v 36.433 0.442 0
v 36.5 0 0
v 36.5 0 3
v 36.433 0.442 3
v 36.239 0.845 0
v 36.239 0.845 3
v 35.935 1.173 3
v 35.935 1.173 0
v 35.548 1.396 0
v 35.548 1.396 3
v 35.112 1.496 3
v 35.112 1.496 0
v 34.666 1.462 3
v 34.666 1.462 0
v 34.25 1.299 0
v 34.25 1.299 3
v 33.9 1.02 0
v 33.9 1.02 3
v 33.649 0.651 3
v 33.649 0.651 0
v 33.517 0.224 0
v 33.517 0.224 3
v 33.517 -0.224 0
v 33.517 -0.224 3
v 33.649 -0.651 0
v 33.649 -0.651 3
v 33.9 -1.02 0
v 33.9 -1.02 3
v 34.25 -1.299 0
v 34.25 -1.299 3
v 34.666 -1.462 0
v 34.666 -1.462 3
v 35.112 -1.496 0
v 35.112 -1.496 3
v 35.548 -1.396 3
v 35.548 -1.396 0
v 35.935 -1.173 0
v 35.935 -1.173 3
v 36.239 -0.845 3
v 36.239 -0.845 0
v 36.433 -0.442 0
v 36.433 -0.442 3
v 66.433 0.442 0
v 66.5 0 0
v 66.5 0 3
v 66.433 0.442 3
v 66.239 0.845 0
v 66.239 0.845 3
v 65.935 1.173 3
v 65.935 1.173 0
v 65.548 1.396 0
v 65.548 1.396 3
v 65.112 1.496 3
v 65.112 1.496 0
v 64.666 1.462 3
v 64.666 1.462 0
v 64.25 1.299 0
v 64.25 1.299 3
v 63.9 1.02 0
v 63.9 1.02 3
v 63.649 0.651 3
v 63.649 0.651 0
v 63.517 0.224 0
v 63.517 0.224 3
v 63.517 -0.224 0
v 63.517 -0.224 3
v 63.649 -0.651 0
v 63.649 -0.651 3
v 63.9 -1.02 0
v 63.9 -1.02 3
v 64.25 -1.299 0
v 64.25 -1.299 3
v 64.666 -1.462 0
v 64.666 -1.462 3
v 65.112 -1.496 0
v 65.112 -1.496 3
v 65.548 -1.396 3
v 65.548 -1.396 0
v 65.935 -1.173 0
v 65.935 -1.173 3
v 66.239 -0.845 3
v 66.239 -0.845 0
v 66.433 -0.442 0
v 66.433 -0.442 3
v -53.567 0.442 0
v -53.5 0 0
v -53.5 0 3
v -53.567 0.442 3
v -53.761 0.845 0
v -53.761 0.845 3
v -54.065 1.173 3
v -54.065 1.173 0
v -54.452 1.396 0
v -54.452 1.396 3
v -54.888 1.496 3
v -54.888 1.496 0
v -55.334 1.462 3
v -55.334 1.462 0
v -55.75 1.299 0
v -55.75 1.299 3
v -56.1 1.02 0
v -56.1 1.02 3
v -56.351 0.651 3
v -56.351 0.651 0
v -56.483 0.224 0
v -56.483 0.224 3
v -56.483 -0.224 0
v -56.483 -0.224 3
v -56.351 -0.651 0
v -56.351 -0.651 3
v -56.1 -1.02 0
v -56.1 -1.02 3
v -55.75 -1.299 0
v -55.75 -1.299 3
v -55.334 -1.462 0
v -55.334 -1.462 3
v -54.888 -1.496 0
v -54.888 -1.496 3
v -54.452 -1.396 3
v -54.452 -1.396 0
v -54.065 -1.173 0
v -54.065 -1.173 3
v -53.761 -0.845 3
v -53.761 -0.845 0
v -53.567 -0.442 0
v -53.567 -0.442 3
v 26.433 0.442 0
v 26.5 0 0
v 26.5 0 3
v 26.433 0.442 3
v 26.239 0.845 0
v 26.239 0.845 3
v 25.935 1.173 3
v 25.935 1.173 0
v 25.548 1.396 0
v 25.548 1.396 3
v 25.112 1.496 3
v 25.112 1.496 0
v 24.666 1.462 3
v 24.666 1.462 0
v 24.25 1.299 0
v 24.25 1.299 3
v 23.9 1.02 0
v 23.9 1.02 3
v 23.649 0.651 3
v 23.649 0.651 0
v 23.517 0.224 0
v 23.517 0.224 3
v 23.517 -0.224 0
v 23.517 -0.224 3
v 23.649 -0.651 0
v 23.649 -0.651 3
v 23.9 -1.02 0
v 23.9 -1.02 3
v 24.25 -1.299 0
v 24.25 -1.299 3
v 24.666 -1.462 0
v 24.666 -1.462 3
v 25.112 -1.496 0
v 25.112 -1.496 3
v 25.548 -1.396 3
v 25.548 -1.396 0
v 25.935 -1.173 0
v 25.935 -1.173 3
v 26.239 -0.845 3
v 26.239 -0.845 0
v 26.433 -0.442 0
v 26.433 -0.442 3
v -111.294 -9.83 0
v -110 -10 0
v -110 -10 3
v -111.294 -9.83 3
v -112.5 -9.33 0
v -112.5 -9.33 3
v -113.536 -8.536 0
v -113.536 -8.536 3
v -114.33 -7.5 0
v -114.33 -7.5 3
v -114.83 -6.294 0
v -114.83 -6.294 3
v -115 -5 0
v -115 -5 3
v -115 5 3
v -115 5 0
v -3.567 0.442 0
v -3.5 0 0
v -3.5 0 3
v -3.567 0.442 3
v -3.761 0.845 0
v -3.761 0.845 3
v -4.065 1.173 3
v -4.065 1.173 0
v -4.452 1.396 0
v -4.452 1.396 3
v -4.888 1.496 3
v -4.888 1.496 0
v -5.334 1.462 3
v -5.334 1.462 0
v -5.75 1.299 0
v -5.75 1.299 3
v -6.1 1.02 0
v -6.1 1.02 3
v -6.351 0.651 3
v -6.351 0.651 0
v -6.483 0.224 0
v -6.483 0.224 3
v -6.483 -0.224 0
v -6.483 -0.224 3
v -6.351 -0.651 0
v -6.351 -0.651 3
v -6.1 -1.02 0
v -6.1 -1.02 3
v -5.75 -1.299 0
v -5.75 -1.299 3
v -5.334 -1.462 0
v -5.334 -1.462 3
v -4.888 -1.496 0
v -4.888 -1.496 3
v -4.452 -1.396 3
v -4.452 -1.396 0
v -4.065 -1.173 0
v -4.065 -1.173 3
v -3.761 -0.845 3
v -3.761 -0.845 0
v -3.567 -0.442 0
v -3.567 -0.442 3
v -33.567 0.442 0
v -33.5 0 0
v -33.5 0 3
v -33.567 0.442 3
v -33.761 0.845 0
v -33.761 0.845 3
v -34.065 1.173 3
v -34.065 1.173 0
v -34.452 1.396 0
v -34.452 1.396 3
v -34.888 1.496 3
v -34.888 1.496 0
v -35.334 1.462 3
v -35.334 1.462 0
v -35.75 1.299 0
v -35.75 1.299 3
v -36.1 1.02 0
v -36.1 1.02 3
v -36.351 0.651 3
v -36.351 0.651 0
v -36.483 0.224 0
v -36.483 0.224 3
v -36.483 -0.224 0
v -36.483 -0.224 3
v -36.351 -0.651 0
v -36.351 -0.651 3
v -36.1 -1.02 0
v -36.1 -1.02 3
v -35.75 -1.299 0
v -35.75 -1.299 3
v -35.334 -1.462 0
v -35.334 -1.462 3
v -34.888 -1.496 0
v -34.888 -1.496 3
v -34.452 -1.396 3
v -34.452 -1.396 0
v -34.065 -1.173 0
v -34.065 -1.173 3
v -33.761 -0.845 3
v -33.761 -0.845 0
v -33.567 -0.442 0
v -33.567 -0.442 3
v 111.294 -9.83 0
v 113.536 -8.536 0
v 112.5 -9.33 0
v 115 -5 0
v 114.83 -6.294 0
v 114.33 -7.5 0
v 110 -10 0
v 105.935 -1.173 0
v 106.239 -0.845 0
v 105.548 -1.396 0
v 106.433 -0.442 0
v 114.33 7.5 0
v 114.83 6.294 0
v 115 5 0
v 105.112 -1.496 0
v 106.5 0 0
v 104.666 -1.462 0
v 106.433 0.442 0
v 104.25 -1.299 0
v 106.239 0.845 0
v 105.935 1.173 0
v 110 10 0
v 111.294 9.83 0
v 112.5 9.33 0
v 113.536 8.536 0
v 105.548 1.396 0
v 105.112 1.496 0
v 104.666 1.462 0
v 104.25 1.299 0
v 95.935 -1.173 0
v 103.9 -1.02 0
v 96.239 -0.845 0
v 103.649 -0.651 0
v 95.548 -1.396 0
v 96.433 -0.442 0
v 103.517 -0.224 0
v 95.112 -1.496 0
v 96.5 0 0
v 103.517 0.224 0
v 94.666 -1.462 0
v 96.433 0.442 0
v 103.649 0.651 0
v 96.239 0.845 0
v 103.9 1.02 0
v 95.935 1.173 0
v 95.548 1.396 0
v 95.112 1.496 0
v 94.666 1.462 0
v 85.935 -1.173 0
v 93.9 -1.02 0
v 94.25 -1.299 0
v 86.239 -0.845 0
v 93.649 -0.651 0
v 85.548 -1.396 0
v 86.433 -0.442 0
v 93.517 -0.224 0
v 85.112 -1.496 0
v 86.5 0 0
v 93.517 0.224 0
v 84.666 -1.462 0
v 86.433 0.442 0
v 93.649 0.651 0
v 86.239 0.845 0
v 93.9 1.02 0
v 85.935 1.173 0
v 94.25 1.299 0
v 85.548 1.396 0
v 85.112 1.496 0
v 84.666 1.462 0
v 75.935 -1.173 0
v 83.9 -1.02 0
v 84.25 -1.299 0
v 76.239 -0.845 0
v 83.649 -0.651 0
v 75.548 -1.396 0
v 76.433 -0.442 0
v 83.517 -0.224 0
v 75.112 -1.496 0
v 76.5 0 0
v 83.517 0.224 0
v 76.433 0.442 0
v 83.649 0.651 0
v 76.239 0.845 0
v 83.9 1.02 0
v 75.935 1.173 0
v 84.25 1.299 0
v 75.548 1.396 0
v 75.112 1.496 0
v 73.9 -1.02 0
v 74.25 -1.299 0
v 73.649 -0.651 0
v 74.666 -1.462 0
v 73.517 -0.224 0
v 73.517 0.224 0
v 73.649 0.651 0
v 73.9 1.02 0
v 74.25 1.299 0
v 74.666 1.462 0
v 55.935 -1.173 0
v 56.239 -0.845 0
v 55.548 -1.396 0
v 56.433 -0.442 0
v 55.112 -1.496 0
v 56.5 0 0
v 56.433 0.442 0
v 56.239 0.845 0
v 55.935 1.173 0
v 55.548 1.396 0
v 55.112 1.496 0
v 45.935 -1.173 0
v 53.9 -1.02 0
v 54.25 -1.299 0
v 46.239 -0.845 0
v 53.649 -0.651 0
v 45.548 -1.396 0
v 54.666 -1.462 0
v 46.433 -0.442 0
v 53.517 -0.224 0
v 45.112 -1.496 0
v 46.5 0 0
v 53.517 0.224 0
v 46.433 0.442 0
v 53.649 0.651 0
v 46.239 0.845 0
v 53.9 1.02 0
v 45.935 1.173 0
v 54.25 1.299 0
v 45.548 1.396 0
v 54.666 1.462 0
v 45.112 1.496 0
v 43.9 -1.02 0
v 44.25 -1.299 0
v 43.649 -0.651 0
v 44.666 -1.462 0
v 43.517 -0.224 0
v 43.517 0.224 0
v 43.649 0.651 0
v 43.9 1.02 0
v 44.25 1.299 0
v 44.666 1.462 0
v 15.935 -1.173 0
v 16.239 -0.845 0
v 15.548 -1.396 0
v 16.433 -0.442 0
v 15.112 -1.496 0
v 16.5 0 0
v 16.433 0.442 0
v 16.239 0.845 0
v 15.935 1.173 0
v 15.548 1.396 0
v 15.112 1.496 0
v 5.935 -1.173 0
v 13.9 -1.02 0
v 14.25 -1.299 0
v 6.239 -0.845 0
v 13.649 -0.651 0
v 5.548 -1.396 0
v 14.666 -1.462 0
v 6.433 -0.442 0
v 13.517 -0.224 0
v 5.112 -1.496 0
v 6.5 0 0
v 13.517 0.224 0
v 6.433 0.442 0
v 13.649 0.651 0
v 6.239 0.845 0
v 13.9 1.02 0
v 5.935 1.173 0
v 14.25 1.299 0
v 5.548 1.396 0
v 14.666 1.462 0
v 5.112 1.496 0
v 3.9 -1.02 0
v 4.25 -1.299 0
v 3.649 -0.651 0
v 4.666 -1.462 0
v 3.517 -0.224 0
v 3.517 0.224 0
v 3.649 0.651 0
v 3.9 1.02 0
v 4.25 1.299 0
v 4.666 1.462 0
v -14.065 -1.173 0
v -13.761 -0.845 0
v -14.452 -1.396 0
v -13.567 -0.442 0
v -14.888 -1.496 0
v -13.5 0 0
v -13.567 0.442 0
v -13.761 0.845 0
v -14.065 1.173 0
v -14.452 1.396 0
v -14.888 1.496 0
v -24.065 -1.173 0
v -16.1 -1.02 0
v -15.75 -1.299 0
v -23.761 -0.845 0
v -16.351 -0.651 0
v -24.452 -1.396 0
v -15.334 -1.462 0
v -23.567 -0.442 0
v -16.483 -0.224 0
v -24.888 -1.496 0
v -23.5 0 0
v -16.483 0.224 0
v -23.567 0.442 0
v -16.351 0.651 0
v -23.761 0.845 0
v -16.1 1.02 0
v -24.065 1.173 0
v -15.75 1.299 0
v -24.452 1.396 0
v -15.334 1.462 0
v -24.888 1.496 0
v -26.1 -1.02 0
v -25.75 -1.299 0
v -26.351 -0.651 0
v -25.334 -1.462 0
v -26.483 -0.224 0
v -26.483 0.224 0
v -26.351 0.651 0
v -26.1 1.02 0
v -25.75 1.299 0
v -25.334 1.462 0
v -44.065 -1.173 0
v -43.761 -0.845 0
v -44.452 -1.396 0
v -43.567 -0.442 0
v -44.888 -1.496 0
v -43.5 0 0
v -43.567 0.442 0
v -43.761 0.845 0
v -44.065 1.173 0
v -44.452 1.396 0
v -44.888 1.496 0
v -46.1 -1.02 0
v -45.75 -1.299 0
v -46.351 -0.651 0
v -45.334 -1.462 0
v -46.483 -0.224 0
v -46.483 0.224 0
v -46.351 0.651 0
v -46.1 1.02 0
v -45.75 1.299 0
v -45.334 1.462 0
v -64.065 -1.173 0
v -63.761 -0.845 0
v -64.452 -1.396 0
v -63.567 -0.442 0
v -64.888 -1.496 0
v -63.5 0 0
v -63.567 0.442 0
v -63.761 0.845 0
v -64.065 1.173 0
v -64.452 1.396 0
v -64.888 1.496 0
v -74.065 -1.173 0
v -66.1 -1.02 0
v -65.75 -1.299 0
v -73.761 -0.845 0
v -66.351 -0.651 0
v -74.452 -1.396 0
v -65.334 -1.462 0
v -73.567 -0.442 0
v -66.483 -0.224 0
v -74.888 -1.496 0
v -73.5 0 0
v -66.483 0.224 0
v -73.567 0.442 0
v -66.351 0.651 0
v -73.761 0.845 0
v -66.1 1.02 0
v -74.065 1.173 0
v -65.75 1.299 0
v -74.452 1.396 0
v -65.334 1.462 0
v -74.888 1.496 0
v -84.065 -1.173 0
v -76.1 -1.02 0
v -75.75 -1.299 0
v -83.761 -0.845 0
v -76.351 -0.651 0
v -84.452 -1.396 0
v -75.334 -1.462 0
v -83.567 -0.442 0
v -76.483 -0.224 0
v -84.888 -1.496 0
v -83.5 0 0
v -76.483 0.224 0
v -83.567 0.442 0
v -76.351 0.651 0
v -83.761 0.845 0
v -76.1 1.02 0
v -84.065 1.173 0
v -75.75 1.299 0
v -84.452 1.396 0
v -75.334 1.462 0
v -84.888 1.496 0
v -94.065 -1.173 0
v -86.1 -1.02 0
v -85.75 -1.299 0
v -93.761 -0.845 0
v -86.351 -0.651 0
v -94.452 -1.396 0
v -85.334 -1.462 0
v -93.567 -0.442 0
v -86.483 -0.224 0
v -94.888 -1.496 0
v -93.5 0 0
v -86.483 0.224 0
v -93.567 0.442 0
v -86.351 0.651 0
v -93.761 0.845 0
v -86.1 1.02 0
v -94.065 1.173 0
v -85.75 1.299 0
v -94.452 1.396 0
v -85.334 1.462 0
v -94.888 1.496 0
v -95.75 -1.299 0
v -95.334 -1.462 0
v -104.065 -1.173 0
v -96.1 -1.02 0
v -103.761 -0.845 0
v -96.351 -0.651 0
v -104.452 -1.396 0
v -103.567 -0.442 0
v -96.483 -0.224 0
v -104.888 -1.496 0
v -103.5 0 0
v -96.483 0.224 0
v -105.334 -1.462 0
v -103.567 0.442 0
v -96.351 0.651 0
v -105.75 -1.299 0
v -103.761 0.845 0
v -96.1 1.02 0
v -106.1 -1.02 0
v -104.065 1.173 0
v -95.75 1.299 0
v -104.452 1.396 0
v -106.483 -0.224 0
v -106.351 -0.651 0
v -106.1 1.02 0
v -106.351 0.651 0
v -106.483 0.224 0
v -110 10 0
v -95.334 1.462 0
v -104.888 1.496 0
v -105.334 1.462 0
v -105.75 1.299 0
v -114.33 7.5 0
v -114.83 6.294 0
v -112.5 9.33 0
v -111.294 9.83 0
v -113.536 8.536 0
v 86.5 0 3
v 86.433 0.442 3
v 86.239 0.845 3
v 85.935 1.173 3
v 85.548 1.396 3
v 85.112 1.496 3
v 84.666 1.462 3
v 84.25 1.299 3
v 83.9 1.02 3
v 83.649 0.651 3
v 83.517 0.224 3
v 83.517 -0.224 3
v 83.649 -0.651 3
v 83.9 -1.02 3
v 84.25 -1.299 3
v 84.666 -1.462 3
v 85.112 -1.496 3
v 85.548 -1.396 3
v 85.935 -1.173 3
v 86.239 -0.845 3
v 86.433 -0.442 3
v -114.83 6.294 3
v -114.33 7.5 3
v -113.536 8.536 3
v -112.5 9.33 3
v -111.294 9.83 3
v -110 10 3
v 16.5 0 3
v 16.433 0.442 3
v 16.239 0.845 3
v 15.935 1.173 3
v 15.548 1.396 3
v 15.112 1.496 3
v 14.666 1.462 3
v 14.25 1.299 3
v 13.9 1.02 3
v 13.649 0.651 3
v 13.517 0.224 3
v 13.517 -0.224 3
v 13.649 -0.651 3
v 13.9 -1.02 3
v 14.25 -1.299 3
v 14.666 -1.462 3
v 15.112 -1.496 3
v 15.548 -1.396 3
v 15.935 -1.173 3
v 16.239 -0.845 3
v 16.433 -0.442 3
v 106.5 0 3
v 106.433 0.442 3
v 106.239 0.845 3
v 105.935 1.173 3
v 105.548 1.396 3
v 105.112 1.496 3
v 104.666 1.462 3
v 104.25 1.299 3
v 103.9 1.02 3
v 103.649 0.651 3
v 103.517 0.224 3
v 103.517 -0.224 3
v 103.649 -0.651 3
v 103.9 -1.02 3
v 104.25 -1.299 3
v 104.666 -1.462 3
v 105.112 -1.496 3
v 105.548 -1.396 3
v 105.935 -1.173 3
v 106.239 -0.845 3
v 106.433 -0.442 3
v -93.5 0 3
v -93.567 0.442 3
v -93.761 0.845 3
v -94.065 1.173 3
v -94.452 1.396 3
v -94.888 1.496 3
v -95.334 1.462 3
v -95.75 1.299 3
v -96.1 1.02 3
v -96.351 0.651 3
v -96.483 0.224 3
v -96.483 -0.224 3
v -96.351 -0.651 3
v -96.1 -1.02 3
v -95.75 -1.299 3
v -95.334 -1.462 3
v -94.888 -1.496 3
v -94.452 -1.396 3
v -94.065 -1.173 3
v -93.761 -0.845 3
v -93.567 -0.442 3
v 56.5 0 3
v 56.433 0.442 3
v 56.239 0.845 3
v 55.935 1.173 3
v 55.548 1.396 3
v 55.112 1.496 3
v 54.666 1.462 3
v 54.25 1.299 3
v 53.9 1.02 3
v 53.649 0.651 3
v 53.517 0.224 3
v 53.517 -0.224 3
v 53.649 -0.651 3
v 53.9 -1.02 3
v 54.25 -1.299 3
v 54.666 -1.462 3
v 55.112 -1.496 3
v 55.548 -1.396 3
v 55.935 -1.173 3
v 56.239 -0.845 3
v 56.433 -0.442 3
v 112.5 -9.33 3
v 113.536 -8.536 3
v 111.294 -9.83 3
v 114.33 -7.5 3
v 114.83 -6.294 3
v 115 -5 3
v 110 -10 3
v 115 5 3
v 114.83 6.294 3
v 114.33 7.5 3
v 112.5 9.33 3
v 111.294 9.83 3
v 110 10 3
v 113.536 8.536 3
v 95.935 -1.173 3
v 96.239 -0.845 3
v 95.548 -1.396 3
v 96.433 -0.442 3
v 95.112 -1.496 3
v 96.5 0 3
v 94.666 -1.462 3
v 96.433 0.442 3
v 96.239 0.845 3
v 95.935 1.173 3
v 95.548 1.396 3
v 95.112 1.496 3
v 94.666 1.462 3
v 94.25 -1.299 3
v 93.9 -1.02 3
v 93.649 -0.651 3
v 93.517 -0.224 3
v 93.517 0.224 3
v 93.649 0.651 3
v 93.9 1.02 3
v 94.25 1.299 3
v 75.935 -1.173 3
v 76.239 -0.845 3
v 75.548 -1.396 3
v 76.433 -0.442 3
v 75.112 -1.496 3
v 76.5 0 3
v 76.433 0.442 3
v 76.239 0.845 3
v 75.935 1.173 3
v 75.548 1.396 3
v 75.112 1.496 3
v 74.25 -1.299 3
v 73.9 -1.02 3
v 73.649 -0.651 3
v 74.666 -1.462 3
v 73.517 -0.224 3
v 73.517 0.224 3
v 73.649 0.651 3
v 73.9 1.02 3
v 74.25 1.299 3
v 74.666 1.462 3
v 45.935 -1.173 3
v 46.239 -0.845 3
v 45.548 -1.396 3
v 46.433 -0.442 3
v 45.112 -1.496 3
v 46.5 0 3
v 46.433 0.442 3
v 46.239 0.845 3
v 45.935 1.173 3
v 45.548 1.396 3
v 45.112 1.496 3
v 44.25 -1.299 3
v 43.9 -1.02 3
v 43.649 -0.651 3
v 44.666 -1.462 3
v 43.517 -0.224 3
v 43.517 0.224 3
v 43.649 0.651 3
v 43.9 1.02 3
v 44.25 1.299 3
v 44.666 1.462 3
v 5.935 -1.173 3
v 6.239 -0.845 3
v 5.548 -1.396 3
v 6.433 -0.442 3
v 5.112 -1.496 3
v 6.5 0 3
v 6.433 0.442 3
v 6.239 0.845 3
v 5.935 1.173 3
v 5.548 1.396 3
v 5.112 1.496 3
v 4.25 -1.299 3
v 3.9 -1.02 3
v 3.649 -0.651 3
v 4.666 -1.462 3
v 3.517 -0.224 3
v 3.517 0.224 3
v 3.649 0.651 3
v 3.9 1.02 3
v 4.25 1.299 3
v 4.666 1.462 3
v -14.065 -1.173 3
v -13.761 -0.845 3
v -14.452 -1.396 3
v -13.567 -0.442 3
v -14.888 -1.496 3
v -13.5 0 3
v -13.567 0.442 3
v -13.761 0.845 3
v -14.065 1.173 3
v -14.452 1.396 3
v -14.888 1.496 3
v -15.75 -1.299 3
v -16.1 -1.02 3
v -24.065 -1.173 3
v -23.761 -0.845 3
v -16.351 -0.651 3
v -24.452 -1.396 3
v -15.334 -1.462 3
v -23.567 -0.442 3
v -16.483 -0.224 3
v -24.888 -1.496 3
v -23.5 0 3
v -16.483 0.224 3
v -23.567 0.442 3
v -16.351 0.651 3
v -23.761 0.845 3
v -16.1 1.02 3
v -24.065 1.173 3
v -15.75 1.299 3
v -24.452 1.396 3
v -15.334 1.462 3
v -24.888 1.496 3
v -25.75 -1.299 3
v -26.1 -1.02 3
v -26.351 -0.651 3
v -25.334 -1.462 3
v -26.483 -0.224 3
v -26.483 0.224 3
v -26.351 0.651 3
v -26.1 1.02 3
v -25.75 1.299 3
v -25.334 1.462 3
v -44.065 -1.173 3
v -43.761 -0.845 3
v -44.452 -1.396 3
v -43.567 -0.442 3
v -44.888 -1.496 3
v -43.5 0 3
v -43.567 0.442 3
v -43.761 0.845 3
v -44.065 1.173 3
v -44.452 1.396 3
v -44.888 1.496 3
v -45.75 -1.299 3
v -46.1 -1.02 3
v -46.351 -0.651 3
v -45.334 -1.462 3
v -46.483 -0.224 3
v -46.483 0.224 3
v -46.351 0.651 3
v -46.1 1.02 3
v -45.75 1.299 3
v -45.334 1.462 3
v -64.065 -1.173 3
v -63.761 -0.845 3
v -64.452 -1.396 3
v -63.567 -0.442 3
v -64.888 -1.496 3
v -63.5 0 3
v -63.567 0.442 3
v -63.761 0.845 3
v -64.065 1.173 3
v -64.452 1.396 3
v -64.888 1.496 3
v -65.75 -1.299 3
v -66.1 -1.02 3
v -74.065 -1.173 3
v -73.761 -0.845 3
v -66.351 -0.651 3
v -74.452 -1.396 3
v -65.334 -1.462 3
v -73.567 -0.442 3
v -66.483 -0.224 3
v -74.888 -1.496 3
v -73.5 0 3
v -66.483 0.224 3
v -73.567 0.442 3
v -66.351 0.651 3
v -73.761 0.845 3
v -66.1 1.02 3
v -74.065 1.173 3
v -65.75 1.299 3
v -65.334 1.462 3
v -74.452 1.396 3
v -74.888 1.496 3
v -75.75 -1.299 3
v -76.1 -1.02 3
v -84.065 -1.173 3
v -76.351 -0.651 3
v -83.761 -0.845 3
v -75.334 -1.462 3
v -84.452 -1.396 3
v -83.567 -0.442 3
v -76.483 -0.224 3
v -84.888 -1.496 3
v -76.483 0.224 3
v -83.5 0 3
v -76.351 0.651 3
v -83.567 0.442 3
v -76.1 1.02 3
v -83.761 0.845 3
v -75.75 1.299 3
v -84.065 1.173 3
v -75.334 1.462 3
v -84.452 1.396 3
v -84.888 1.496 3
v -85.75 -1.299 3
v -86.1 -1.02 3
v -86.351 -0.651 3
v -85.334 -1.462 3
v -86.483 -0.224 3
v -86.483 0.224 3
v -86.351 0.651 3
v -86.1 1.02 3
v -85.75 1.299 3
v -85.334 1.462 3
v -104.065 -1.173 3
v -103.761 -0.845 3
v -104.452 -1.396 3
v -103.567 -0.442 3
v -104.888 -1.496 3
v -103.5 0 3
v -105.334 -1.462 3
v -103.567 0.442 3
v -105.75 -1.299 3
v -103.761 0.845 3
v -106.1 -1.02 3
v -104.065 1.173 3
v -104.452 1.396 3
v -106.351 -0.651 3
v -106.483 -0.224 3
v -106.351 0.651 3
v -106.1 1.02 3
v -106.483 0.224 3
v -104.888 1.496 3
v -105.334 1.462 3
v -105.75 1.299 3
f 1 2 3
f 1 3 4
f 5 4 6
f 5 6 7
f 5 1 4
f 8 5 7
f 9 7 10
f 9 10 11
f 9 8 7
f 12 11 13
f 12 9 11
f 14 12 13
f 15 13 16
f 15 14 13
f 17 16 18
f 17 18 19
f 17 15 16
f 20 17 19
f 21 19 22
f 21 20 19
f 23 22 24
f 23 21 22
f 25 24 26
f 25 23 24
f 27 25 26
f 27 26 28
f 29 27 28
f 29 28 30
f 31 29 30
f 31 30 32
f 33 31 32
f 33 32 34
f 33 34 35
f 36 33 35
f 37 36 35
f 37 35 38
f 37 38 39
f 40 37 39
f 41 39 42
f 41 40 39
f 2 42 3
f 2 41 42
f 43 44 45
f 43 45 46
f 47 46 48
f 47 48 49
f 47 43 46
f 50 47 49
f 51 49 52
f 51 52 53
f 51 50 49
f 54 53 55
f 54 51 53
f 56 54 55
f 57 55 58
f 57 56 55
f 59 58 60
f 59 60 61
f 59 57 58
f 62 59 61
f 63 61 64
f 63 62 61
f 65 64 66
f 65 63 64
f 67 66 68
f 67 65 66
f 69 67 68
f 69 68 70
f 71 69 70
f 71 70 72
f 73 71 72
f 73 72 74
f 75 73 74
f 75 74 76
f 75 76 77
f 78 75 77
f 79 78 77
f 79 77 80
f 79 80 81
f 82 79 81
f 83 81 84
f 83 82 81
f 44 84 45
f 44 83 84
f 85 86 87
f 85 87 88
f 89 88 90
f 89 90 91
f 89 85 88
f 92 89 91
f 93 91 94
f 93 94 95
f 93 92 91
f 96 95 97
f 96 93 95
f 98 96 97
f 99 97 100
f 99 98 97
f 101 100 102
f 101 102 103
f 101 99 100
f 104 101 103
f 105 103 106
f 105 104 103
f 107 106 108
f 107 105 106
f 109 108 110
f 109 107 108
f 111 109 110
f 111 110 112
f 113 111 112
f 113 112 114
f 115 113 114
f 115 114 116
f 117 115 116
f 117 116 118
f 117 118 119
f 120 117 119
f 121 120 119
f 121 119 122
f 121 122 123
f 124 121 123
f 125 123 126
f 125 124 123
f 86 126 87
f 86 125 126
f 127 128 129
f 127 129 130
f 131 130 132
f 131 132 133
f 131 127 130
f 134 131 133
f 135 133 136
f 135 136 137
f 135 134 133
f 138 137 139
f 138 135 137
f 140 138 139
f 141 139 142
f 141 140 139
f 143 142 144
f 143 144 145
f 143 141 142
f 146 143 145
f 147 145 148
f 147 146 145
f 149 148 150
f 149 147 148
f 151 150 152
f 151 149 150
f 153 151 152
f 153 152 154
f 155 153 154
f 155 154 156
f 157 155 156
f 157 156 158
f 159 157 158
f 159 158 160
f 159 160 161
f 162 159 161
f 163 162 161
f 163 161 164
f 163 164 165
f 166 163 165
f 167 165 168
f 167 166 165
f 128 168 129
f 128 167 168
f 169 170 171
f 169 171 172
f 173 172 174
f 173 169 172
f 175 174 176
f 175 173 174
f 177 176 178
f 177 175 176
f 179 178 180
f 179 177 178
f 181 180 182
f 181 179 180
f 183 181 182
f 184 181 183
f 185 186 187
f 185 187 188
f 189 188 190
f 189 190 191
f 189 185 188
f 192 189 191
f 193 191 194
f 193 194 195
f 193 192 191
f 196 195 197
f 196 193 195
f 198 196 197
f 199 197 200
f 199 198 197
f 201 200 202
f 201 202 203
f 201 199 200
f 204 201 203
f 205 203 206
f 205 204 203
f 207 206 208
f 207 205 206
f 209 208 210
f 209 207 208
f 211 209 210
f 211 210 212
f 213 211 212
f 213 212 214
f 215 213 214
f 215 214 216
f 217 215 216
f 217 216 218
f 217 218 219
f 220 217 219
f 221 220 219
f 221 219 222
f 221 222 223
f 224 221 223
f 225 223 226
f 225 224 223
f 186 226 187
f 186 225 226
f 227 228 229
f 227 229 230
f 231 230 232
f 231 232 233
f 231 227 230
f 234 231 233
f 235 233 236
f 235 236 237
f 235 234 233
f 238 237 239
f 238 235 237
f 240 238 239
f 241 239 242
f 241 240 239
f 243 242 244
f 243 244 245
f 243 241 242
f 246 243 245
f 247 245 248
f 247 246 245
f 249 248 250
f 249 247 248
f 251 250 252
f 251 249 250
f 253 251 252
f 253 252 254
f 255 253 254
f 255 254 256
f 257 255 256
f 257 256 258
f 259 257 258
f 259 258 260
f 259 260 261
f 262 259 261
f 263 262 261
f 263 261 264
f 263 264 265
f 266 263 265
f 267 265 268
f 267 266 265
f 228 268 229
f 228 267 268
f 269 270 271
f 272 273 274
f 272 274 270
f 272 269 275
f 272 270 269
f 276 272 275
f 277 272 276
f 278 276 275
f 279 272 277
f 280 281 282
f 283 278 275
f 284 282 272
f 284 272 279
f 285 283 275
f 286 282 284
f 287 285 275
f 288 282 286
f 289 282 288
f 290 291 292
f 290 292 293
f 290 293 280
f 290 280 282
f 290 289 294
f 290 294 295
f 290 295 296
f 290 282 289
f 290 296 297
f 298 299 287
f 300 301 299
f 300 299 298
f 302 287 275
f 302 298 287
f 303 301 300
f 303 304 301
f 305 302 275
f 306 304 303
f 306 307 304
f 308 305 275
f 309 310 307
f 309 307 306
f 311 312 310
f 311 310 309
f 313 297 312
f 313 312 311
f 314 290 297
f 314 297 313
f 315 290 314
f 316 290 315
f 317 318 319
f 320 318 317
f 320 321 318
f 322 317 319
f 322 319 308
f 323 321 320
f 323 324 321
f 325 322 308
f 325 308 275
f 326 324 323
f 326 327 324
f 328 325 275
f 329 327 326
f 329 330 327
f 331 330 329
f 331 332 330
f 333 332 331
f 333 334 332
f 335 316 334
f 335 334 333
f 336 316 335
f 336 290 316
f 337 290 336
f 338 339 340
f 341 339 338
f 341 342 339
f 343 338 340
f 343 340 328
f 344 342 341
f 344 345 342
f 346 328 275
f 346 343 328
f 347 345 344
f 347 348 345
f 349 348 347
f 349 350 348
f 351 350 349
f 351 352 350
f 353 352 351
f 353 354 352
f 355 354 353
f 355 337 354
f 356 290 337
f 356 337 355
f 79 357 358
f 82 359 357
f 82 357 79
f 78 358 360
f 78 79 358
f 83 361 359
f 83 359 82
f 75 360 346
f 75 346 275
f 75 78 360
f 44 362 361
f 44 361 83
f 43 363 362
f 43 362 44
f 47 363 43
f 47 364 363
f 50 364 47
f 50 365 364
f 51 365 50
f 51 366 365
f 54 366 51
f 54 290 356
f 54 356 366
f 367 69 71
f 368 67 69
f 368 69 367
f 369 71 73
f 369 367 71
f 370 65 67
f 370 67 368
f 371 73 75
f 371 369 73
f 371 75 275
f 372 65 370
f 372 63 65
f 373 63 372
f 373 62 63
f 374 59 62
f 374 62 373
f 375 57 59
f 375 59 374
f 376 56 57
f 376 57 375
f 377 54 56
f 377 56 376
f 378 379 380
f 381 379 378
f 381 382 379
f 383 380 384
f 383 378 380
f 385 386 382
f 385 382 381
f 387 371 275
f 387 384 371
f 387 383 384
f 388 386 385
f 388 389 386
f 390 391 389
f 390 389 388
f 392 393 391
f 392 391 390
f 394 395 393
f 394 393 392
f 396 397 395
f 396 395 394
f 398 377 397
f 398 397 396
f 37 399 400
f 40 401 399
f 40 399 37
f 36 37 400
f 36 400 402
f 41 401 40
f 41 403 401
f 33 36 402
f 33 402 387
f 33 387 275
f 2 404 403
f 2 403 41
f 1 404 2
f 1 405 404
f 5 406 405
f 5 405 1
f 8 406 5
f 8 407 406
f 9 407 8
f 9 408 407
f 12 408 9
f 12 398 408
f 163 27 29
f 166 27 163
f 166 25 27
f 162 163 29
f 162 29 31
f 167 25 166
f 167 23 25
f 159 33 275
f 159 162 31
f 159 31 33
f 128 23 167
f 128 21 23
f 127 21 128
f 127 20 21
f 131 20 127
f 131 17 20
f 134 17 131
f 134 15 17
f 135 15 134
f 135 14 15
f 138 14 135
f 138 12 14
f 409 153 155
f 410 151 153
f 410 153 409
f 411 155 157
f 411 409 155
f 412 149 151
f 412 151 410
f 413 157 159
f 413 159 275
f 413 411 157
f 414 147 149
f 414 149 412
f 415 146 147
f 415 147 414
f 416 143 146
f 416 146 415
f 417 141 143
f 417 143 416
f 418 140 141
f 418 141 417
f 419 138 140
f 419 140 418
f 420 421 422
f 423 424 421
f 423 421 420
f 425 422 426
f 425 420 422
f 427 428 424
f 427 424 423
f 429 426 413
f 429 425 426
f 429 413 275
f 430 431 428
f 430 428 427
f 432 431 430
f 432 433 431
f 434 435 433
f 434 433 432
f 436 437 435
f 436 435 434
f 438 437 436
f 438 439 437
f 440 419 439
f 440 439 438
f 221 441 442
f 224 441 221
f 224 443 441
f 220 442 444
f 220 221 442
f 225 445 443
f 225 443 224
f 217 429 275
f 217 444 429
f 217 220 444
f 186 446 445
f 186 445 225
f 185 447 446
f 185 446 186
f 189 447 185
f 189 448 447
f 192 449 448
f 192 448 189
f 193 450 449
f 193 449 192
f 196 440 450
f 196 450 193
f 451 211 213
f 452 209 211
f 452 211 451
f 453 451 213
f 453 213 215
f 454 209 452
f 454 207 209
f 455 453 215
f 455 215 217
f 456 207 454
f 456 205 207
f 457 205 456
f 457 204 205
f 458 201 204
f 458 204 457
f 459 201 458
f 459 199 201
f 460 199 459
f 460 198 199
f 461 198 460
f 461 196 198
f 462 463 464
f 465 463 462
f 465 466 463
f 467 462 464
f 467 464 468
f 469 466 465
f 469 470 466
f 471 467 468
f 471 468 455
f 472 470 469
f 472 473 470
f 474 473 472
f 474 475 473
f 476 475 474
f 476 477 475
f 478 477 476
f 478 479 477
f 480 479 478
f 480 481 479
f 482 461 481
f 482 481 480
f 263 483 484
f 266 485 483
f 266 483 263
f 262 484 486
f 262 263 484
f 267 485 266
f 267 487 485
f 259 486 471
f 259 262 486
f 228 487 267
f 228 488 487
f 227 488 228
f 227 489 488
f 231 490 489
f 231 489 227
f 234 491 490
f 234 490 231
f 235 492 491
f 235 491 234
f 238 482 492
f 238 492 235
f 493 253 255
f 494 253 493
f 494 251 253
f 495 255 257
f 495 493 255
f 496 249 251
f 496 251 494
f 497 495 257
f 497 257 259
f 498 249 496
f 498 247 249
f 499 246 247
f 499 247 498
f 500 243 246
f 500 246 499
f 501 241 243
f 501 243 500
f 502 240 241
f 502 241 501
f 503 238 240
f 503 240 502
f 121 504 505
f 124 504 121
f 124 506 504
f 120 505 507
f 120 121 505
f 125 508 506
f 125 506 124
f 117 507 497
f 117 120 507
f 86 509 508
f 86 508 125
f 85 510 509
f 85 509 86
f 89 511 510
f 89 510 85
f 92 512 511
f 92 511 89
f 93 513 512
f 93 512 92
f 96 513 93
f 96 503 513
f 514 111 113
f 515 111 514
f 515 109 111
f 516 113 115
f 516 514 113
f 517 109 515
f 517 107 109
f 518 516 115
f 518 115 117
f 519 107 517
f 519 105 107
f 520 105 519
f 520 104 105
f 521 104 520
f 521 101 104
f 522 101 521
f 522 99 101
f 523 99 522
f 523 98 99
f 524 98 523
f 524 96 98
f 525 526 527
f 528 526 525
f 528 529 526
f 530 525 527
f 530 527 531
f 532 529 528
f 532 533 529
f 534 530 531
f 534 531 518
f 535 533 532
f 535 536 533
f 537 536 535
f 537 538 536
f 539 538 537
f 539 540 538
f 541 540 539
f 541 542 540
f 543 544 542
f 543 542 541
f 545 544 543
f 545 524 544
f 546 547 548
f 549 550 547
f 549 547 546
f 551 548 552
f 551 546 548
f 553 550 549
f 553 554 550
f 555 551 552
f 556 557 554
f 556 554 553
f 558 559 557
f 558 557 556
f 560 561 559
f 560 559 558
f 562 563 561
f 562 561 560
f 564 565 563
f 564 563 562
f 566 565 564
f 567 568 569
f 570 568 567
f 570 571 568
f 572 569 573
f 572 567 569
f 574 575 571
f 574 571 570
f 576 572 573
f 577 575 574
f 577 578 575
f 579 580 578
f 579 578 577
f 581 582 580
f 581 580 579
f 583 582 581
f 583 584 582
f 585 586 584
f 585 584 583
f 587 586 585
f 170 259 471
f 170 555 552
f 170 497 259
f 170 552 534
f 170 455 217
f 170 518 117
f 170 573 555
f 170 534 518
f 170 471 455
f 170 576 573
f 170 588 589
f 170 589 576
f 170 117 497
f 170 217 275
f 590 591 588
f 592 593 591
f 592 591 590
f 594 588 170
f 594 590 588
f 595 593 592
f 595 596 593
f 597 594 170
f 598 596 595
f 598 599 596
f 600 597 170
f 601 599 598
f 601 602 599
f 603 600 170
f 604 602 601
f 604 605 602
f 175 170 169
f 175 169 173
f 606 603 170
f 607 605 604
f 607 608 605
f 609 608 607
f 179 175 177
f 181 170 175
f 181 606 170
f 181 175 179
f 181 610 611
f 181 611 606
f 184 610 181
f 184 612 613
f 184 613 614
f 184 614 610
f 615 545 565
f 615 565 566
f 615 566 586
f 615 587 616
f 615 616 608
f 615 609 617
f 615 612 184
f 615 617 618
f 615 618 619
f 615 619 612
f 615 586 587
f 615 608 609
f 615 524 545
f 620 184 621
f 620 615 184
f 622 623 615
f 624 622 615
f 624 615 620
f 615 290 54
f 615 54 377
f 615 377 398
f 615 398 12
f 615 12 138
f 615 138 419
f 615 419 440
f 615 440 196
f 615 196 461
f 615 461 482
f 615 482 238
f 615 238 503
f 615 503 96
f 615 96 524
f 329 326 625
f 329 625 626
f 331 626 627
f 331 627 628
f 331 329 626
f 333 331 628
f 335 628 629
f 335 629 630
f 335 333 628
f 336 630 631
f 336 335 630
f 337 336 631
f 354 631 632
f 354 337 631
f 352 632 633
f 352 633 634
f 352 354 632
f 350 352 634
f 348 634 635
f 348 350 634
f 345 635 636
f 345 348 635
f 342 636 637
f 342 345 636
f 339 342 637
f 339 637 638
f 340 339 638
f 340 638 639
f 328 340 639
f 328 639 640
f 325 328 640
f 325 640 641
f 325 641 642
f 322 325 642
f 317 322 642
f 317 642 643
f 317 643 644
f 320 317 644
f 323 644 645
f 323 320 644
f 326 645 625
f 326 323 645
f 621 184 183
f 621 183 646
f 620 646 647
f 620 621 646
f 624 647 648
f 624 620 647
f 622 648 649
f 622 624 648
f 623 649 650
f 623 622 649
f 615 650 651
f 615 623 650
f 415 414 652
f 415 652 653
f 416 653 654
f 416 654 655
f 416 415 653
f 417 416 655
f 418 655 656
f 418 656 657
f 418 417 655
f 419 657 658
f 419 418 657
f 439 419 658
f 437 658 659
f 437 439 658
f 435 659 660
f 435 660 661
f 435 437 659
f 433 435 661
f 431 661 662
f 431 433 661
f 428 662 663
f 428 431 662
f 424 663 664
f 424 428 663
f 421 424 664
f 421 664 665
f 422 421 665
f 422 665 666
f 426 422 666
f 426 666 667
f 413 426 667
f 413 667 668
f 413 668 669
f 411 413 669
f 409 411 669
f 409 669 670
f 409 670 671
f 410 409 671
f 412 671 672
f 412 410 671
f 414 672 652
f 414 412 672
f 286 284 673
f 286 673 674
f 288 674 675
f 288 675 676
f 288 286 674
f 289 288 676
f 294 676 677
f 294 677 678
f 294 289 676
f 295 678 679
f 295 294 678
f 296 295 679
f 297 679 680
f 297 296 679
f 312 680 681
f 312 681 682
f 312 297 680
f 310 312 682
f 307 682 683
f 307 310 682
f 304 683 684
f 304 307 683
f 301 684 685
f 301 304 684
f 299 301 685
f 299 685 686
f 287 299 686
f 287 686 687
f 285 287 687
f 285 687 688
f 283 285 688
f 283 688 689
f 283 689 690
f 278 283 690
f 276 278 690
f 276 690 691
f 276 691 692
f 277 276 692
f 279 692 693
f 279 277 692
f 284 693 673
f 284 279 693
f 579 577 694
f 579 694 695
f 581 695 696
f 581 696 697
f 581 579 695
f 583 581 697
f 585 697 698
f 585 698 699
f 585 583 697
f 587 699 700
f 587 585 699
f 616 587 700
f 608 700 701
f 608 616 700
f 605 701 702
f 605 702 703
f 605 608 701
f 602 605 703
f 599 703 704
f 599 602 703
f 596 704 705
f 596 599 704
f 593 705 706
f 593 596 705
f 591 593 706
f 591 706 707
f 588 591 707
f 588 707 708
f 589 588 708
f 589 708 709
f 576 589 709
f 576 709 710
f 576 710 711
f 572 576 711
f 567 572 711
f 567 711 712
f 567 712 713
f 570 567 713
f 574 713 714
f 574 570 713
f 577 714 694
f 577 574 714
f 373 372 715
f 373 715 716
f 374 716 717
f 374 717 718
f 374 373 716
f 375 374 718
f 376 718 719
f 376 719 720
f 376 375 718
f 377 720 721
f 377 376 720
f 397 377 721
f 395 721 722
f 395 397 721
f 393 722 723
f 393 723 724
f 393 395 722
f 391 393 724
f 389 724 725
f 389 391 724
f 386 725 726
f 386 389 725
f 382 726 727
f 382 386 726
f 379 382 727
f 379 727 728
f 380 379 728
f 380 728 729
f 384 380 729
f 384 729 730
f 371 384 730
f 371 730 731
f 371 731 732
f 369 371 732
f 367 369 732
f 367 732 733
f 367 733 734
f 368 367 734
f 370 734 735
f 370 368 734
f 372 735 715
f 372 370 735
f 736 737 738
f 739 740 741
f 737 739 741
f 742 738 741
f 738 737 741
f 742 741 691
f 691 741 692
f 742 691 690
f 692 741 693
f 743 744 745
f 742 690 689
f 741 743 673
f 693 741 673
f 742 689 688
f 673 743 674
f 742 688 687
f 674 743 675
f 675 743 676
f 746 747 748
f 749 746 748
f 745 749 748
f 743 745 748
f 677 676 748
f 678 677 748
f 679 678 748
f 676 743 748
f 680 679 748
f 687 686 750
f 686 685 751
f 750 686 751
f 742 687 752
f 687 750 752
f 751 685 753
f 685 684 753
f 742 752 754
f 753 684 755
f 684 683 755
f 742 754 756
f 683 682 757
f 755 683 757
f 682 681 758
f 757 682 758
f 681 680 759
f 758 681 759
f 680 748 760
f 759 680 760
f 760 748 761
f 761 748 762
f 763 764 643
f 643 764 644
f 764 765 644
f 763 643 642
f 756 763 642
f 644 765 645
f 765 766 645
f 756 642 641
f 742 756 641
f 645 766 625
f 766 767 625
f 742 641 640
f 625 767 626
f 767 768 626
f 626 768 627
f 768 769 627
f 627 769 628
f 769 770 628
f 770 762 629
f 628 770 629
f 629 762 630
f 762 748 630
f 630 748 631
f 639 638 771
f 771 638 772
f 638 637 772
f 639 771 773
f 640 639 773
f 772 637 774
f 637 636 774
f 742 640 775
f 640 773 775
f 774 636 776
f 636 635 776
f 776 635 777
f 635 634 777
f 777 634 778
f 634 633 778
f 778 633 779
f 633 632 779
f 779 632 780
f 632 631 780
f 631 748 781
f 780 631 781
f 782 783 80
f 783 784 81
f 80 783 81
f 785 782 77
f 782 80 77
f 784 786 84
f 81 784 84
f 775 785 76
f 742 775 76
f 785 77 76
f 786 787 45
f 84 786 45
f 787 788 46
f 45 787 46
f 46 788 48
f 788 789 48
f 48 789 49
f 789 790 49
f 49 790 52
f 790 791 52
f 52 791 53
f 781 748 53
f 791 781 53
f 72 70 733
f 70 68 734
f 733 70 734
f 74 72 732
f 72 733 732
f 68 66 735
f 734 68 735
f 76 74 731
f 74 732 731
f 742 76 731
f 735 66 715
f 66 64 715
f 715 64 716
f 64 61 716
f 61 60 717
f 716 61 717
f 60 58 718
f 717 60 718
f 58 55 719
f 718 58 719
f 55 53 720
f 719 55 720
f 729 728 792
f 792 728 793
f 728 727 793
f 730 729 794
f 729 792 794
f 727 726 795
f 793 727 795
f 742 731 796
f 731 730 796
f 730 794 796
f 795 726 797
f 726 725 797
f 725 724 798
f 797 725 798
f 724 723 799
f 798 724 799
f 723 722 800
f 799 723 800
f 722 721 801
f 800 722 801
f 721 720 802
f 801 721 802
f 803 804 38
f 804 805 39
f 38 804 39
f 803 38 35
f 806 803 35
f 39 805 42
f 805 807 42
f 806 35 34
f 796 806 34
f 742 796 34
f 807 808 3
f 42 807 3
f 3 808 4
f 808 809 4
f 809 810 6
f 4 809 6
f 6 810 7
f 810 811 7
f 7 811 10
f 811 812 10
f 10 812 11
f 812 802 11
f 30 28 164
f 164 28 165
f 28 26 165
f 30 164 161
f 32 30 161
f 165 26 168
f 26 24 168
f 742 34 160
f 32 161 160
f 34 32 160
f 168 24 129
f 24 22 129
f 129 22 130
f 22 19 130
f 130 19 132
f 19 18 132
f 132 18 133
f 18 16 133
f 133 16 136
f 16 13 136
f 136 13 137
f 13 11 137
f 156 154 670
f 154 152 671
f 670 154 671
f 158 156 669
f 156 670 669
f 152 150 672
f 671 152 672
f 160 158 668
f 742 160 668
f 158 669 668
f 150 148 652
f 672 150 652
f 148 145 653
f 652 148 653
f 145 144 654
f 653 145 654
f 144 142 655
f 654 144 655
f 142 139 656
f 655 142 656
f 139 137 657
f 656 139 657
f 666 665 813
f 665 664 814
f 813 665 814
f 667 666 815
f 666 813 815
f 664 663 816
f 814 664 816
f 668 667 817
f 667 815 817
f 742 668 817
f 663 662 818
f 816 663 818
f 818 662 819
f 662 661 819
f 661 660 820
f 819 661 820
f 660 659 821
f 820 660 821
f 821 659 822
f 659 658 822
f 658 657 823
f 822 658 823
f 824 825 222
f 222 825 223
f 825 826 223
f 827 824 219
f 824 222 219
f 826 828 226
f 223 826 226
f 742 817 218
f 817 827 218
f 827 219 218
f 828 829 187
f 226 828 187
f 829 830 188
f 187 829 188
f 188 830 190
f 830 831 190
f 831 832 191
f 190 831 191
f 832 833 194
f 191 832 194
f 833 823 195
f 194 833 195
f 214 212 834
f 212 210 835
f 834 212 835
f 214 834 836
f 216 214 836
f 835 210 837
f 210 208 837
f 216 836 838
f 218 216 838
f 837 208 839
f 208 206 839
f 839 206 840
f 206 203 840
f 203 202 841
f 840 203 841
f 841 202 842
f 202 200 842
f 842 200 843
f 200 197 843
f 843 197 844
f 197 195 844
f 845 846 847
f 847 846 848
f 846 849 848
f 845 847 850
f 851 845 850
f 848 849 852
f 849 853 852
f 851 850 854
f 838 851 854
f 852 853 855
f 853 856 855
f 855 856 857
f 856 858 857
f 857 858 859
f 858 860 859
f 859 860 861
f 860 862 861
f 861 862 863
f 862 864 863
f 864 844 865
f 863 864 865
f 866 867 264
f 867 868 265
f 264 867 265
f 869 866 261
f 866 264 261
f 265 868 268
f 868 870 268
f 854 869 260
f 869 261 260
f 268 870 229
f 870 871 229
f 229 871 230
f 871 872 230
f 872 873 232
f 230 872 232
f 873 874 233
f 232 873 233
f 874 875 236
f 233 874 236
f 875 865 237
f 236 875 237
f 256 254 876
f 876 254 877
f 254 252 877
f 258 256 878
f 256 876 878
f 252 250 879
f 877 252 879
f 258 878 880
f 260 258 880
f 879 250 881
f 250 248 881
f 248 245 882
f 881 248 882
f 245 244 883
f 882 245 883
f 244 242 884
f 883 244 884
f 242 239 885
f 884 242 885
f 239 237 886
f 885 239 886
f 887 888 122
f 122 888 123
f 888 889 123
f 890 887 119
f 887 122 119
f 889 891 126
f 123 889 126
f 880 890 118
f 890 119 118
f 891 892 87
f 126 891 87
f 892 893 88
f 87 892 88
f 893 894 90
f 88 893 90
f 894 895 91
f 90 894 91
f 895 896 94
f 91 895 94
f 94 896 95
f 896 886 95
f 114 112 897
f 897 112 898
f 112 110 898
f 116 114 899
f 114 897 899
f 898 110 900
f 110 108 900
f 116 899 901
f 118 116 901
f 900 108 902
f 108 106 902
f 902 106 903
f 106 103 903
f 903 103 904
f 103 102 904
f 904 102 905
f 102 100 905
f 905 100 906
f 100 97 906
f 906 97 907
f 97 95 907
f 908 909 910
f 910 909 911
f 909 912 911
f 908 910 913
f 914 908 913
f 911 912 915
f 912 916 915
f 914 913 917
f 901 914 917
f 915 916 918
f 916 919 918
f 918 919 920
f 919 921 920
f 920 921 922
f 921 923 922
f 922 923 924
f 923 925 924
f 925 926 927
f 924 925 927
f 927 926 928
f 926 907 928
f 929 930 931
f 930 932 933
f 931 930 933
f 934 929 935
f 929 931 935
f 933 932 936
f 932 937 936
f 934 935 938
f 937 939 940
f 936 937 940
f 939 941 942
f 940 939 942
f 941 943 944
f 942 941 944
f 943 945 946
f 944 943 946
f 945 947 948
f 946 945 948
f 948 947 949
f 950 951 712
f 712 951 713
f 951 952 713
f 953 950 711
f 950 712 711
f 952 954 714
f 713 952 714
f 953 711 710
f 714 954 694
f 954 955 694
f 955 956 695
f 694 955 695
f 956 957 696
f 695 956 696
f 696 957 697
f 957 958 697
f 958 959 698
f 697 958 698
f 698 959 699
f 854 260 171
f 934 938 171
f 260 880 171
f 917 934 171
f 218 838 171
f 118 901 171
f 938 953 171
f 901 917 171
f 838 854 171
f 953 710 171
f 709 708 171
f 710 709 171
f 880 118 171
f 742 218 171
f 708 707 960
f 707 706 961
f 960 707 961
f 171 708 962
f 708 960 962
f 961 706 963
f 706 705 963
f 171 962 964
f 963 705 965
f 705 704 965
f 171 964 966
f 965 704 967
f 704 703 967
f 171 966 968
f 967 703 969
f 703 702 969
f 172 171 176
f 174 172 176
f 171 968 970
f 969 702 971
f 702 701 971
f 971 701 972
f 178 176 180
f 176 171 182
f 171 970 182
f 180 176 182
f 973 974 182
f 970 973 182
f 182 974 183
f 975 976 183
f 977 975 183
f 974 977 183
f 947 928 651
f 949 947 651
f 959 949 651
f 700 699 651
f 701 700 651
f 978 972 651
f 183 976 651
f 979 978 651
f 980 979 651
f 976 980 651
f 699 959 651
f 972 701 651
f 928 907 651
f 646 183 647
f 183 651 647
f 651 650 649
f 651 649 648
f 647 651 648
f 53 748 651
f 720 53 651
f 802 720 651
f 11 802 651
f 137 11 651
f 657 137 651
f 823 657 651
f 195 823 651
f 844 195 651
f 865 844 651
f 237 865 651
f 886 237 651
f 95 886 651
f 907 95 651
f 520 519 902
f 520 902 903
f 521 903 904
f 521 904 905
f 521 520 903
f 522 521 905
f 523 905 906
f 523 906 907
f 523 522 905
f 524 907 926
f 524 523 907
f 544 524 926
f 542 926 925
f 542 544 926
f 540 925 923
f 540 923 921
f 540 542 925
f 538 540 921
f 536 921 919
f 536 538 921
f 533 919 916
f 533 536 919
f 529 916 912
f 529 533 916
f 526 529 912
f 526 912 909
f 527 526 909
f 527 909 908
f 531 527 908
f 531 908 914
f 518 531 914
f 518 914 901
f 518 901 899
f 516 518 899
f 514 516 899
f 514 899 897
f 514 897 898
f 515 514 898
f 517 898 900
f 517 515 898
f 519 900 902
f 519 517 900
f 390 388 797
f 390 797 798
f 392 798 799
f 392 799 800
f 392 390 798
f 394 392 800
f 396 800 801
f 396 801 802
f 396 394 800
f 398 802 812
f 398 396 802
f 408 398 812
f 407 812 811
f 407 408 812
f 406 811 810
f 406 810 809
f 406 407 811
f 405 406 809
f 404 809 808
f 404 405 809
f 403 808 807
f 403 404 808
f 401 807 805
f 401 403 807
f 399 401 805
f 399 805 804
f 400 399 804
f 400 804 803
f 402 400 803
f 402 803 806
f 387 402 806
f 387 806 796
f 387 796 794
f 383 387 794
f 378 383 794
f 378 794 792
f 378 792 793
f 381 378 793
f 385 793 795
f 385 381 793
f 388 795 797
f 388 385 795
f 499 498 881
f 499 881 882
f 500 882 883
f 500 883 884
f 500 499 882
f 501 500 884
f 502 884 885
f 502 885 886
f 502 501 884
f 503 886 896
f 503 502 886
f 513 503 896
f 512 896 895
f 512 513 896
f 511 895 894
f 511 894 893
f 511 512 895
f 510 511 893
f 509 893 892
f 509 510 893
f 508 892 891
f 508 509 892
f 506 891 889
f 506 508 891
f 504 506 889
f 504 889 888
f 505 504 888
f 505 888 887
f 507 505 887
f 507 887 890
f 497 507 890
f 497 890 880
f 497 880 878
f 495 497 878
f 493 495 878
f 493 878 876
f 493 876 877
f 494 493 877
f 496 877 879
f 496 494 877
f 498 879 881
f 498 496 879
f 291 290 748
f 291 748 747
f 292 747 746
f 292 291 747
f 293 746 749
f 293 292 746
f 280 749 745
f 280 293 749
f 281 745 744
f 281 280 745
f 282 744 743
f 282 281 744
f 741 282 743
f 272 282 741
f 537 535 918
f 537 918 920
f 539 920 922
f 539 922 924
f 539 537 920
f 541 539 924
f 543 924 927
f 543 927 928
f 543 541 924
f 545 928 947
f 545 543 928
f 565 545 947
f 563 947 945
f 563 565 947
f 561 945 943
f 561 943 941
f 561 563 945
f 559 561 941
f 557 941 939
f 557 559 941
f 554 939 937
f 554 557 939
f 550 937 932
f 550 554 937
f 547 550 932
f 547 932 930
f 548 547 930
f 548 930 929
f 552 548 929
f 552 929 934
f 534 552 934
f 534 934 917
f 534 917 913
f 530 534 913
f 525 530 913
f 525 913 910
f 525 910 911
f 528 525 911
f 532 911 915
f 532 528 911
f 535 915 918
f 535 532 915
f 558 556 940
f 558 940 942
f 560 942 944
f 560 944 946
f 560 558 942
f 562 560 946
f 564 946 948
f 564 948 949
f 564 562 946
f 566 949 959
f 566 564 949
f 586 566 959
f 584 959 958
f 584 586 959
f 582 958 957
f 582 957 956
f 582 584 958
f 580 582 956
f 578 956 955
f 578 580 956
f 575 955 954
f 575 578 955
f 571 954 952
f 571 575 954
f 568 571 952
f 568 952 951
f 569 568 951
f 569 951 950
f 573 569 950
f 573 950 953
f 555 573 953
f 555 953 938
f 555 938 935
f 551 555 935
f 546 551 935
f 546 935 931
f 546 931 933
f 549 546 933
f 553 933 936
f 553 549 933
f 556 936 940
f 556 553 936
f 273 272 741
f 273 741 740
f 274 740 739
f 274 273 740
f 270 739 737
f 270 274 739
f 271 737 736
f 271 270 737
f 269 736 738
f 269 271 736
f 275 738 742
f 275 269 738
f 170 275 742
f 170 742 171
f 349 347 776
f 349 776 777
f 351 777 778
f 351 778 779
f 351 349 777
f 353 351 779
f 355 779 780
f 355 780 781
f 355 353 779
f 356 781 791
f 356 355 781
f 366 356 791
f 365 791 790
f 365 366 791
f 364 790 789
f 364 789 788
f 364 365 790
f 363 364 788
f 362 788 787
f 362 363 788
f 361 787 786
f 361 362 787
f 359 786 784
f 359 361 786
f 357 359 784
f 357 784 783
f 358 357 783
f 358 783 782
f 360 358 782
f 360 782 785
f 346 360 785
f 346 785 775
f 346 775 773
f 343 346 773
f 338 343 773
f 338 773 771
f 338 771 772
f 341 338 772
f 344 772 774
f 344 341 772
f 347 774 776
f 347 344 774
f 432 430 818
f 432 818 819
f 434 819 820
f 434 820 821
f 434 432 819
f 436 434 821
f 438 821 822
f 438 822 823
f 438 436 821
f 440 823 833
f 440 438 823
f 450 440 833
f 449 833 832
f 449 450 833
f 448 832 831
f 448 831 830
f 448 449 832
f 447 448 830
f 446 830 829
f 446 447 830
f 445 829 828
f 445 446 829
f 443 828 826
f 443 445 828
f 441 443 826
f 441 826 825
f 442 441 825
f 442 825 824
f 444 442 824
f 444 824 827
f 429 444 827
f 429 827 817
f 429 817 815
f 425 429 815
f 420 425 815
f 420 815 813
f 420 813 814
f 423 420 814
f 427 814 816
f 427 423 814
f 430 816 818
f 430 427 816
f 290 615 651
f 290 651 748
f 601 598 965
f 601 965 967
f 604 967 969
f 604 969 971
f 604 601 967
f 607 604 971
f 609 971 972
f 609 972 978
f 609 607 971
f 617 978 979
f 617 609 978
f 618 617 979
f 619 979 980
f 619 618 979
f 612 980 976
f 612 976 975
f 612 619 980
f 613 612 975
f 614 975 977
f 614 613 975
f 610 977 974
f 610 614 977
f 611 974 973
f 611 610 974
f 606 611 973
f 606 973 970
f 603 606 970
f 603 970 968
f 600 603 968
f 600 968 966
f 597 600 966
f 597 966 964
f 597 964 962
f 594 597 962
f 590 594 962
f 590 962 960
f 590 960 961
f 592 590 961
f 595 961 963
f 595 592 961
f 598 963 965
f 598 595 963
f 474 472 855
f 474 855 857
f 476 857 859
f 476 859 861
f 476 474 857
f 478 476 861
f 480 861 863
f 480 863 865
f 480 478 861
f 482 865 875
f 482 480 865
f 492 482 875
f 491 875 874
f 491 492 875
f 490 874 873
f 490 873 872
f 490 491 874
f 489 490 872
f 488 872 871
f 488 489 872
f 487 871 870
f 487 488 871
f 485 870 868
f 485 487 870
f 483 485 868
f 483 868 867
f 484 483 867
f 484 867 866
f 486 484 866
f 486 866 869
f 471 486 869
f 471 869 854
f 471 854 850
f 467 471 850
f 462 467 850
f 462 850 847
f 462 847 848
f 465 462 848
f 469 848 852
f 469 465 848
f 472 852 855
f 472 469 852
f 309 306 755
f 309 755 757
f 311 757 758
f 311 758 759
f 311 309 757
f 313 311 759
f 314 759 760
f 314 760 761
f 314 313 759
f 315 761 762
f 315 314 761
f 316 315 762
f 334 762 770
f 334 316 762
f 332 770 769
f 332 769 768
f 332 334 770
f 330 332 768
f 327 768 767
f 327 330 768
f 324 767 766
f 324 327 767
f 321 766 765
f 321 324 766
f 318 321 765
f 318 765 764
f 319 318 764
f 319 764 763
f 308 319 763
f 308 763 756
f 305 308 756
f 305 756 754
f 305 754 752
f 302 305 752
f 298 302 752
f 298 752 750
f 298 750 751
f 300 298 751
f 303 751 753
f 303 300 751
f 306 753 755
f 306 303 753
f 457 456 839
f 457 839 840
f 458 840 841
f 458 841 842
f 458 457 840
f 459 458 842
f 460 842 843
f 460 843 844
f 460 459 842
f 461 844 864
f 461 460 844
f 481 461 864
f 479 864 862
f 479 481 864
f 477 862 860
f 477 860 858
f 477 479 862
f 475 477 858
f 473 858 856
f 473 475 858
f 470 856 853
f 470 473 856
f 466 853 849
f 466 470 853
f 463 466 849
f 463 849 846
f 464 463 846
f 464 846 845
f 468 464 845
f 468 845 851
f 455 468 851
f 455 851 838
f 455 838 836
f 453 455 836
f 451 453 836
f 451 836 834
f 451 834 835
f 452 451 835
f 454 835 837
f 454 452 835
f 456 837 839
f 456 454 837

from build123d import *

# Parameters (mm, degrees)
SKETCH1_R           = 1.5
BOSS_EXTRUDE1_DEPTH = 3


with BuildPart() as part:
    # Sketch1 → Boss-Extrude1 (new body)
    with BuildSketch(Plane.XY):
        with BuildLine():
            Line((-110, 10), (110, 10))
            ThreePointArc((110, 10), (113.535533906, 8.535533906), (115, 5))
            Line((115, 5), (115, -5))
            ThreePointArc((115, -5), (113.535533906, -8.535533906), (110, -10))
            Line((110, -10), (-110, -10))
            ThreePointArc((-110, -10), (-113.535533906, -8.535533906), (-115, -5))
            Line((-115, -5), (-115, 5))
            ThreePointArc((-115, 5), (-113.535533906, 8.535533906), (-110, 10))
        make_face()
        with Locations((-105, 0)):
            Circle(SKETCH1_R, mode=Mode.SUBTRACT)
        with Locations((-95, 0)):
            Circle(SKETCH1_R, mode=Mode.SUBTRACT)
        with Locations((-85, 0)):
            Circle(SKETCH1_R, mode=Mode.SUBTRACT)
        with Locations((-75, 0)):
            Circle(SKETCH1_R, mode=Mode.SUBTRACT)
        with Locations((-65, 0)):
            Circle(SKETCH1_R, mode=Mode.SUBTRACT)
        with Locations((-55, 0)):
            Circle(SKETCH1_R, mode=Mode.SUBTRACT)
        with Locations((-45, 0)):
            Circle(SKETCH1_R, mode=Mode.SUBTRACT)
        with Locations((-35, 0)):
            Circle(SKETCH1_R, mode=Mode.SUBTRACT)
        with Locations((-25, 0)):
            Circle(SKETCH1_R, mode=Mode.SUBTRACT)
        with Locations((-15, 0)):
            Circle(SKETCH1_R, mode=Mode.SUBTRACT)
        with Locations((-5, 0)):
            Circle(SKETCH1_R, mode=Mode.SUBTRACT)
        with Locations((15, 0)):
            Circle(SKETCH1_R, mode=Mode.SUBTRACT)
        with Locations((25, 0)):
            Circle(SKETCH1_R, mode=Mode.SUBTRACT)
        with Locations((5, 0)):
            Circle(SKETCH1_R, mode=Mode.SUBTRACT)
        with Locations((35, 0)):
            Circle(SKETCH1_R, mode=Mode.SUBTRACT)
        with Locations((45, 0)):
            Circle(SKETCH1_R, mode=Mode.SUBTRACT)
        with Locations((55, 0)):
            Circle(SKETCH1_R, mode=Mode.SUBTRACT)
        with Locations((65, 0)):
            Circle(SKETCH1_R, mode=Mode.SUBTRACT)
        with Locations((75, 0)):
            Circle(SKETCH1_R, mode=Mode.SUBTRACT)
        with Locations((85, 0)):
            Circle(SKETCH1_R, mode=Mode.SUBTRACT)
        with Locations((95, 0)):
            Circle(SKETCH1_R, mode=Mode.SUBTRACT)
        with Locations((105, 0)):
            Circle(SKETCH1_R, mode=Mode.SUBTRACT)
    extrude(amount=BOSS_EXTRUDE1_DEPTH)


solid = part.part
